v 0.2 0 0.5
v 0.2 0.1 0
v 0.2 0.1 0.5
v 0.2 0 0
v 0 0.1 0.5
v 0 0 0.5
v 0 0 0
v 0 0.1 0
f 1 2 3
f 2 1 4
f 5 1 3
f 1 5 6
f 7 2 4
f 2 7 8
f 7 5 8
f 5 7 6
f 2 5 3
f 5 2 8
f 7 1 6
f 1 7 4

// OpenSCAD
//
// pbr.scad — Flat-panel photobioreactor with optional horizontal baffle cylinders
// Author: (your name / org)
// Usage examples:
//
// 1) View / export fluid domain without baffles (plain panel):
//    openscad -o pbr_plain.stl -D MODE=0 pbr.scad
//
// 2) Fluid domain with baffle voids (recommended for snappyHexMesh):
//    openscad -o pbr_with_baffles_voids.stl -D MODE=1 -D W=0.20 -D H=0.50 -D D=0.10 -D NB=3 -D R=0.01 pbr.scad
//
// 3) Just the baffle solids (if you want separate STL for obstacles):
//    openscad -o pbr_baffles_only.stl -D MODE=2 -D W=0.20 -D H=0.50 -D D=0.10 -D NB=5 -D R=0.01 pbr.scad
//
// Coordinates and conventions:
//  - X: width (large dimension on the face), variable W
//  - Z: height, variable H
//  - Y: depth (small thickness between large faces), variable D
//  - The flat panel is a rectangular block [0..W] x [0..D] x [0..H].
//  - Baffles are horizontal cylinders whose axes run along +Y (depth), i.e. perpendicular to the large faces.
//    Implemented by rotating cylinders so their axis aligns with Y.
//


// ---------- Parameters (can be overridden with -D on CLI) ----------

// Geometry (meters)
W0 = 0.20;                  // default width  (X)
H0 = 0.50;                  // default height (Z)
D0 = 0.10;                  // default depth  (Y)

// Baffles
NB0 = 0;                    // default number of baffles: 0, 1, 3, or 5 preferred
R0  = 0.01;                 // default baffle radius (m) — all baffles same radius

// Export mode: 0=fluid_only, 1=fluid_minus_baffles, 2=baffles_only
MODE0 = 1;

// Rendering quality for cylinders
$fn = 96;

// Read external overrides if provided (OpenSCAD: -D W=..., -D H=..., etc.)
W    = is_undef(W)    ? W0    : W;
H    = is_undef(H)    ? H0    : H;
D    = is_undef(D)    ? D0    : D;
NB   = is_undef(NB)   ? NB0   : NB;
R    = is_undef(R)    ? R0    : R;
MODE = is_undef(MODE) ? MODE0 : MODE;

// A small epsilon to avoid coplanar artifacts
eps = 1e-6;

// Margin from walls to keep baffles away from boundaries
// Choose a conservative margin relative to baffle radius and panel size
margin = max(2*R, min(W, H)/10);


// ---------- Utility functions ----------

function clamp(x, a, b) = (x < a) ? a : ((x > b) ? b : x);

// Equilateral triangle side that fits within width & height given margins
function tri_side_fit(W, H, m) = 
    // s must satisfy: s <= W-2m and (sqrt(3)/2)*s <= H-2m
    min(W - 2*m, 2*(H - 2*m)/sqrt(3));

// Side length for the centered square
function sq_side_fit(W, H, m) = min(W - 2*m, H - 2*m);

// Grid helper: rows/cols for a near-square grid to place N points
function grid_rows(N) = ceil(sqrt(N));
function grid_cols(N) = ceil(N / grid_rows(N));

// Produce up to N positions in a centered grid inside margins
function grid_positions(N, W, H, m) =
    let(
        rows = grid_rows(N),
        cols = grid_cols(N),
        sx   = (cols == 1) ? 0 : (W - 2*m) / (cols - 1),
        sz   = (rows == 1) ? 0 : (H - 2*m) / (rows - 1)
    )
    [
      for (j = [0:rows-1], i = [0:cols-1])
        if (i + j*cols < N)
          [ m + i*sx, m + j*sz ]
    ];

// Pattern generators return an array of [x,z] centers:

// 0 baffles => empty list
function positions_0() = [];

// 1 centered baffle
function positions_1(W, H) = [ [W/2, H/2] ];

// 3 as an equilateral triangle centered in the face
function positions_3(W, H, m) =
    let(
        s    = 0.9 * tri_side_fit(W, H, m),      // scale slightly to keep safe margins
        htri = s*sqrt(3)/2,
        cx   = W/2,
        cz   = H/2
    ) [
        [ cx - s/2,      cz - htri/3 ],
        [ cx + s/2,      cz - htri/3 ],
        [ cx,            cz + 2*htri/3 ]
    ];

// 5 as a centered square + center
function positions_5(W, H, m) =
    let(
        s  = 0.7 * sq_side_fit(W, H, m),
        cx = W/2,
        cz = H/2,
        a  = s/2
    ) [
        [ cx - a, cz - a ],
        [ cx + a, cz - a ],
        [ cx - a, cz + a ],
        [ cx + a, cz + a ],
        [ cx,     cz     ]
    ];

// Fallbacks for other NB values:
//  - 2: two along vertical line through center
function positions_2(W, H, m) =
    let(
        cz1 = clamp(H/2 - (H - 2*m)/4, m, H - m),
        cz2 = clamp(H/2 + (H - 2*m)/4, m, H - m)
    ) [
        [ W/2, cz1 ],
        [ W/2, cz2 ]
    ];

// 4: corners of a centered square (no center)
function positions_4(W, H, m) =
    let(
        s  = 0.7 * sq_side_fit(W, H, m),
        cx = W/2, cz = H/2, a = s/2
    ) [
        [ cx - a, cz - a ],
        [ cx + a, cz - a ],
        [ cx - a, cz + a ],
        [ cx + a, cz + a ]
    ];

// Generic N: a centered grid inside margins
function positions_generic(N, W, H, m) = grid_positions(N, W, H, m);


// Dispatcher for patterns
function baffle_positions(N, W, H, m) =
    (N <= 0) ? positions_0() :
    (N == 1) ? positions_1(W, H) :
    (N == 2) ? positions_2(W, H, m) :
    (N == 3) ? positions_3(W, H, m) :
    (N == 4) ? positions_4(W, H, m) :
    (N == 5) ? positions_5(W, H, m) :
               positions_generic(N, W, H, m);


// ---------- Geometry modules ----------

// The flat panel fluid domain: rectangular prism from (0,0,0) to (W,D,H)
module fluid_domain() {
    // Slightly expand in Y by eps to avoid coincident faces when subtracting
    translate([0, -eps, 0])
        cube([W, D + 2*eps, H], center=false);
}

// One horizontal baffle cylinder at (x,z), axis along +Y
module baffle_at(x, z, r=R, depth=D) {
    // Place cylinder centered in Y (so it spans 0..D), and at X=x, Z=z
    // Default cylinder axis is along Z; rotate -90° around X to align with Y
    translate([x, D/2, z])
        rotate([-90, 0, 0])
            cylinder(h=depth, r=r, center=true);
}

// All baffles as union
module baffles() {
    positions = baffle_positions(NB, W, H, margin);
    if (len(positions) > 0)
        union() {
            for (p = positions)
                baffle_at(p[0], p[1], R, D);
        }
}


// ---------- Top-level export selector ----------

if (MODE == 0) {
    // fluid_only
    fluid_domain();
}
else if (MODE == 1) {
    // fluid_minus_baffles (voids where baffles sit)
    difference() {
        fluid_domain();
        baffles();
    }
}
else if (MODE == 2) {
    // baffles_only
    baffles();
}
else {
    // default to fluid_minus_baffles
    difference() {
        fluid_domain();
        baffles();
    }
}
